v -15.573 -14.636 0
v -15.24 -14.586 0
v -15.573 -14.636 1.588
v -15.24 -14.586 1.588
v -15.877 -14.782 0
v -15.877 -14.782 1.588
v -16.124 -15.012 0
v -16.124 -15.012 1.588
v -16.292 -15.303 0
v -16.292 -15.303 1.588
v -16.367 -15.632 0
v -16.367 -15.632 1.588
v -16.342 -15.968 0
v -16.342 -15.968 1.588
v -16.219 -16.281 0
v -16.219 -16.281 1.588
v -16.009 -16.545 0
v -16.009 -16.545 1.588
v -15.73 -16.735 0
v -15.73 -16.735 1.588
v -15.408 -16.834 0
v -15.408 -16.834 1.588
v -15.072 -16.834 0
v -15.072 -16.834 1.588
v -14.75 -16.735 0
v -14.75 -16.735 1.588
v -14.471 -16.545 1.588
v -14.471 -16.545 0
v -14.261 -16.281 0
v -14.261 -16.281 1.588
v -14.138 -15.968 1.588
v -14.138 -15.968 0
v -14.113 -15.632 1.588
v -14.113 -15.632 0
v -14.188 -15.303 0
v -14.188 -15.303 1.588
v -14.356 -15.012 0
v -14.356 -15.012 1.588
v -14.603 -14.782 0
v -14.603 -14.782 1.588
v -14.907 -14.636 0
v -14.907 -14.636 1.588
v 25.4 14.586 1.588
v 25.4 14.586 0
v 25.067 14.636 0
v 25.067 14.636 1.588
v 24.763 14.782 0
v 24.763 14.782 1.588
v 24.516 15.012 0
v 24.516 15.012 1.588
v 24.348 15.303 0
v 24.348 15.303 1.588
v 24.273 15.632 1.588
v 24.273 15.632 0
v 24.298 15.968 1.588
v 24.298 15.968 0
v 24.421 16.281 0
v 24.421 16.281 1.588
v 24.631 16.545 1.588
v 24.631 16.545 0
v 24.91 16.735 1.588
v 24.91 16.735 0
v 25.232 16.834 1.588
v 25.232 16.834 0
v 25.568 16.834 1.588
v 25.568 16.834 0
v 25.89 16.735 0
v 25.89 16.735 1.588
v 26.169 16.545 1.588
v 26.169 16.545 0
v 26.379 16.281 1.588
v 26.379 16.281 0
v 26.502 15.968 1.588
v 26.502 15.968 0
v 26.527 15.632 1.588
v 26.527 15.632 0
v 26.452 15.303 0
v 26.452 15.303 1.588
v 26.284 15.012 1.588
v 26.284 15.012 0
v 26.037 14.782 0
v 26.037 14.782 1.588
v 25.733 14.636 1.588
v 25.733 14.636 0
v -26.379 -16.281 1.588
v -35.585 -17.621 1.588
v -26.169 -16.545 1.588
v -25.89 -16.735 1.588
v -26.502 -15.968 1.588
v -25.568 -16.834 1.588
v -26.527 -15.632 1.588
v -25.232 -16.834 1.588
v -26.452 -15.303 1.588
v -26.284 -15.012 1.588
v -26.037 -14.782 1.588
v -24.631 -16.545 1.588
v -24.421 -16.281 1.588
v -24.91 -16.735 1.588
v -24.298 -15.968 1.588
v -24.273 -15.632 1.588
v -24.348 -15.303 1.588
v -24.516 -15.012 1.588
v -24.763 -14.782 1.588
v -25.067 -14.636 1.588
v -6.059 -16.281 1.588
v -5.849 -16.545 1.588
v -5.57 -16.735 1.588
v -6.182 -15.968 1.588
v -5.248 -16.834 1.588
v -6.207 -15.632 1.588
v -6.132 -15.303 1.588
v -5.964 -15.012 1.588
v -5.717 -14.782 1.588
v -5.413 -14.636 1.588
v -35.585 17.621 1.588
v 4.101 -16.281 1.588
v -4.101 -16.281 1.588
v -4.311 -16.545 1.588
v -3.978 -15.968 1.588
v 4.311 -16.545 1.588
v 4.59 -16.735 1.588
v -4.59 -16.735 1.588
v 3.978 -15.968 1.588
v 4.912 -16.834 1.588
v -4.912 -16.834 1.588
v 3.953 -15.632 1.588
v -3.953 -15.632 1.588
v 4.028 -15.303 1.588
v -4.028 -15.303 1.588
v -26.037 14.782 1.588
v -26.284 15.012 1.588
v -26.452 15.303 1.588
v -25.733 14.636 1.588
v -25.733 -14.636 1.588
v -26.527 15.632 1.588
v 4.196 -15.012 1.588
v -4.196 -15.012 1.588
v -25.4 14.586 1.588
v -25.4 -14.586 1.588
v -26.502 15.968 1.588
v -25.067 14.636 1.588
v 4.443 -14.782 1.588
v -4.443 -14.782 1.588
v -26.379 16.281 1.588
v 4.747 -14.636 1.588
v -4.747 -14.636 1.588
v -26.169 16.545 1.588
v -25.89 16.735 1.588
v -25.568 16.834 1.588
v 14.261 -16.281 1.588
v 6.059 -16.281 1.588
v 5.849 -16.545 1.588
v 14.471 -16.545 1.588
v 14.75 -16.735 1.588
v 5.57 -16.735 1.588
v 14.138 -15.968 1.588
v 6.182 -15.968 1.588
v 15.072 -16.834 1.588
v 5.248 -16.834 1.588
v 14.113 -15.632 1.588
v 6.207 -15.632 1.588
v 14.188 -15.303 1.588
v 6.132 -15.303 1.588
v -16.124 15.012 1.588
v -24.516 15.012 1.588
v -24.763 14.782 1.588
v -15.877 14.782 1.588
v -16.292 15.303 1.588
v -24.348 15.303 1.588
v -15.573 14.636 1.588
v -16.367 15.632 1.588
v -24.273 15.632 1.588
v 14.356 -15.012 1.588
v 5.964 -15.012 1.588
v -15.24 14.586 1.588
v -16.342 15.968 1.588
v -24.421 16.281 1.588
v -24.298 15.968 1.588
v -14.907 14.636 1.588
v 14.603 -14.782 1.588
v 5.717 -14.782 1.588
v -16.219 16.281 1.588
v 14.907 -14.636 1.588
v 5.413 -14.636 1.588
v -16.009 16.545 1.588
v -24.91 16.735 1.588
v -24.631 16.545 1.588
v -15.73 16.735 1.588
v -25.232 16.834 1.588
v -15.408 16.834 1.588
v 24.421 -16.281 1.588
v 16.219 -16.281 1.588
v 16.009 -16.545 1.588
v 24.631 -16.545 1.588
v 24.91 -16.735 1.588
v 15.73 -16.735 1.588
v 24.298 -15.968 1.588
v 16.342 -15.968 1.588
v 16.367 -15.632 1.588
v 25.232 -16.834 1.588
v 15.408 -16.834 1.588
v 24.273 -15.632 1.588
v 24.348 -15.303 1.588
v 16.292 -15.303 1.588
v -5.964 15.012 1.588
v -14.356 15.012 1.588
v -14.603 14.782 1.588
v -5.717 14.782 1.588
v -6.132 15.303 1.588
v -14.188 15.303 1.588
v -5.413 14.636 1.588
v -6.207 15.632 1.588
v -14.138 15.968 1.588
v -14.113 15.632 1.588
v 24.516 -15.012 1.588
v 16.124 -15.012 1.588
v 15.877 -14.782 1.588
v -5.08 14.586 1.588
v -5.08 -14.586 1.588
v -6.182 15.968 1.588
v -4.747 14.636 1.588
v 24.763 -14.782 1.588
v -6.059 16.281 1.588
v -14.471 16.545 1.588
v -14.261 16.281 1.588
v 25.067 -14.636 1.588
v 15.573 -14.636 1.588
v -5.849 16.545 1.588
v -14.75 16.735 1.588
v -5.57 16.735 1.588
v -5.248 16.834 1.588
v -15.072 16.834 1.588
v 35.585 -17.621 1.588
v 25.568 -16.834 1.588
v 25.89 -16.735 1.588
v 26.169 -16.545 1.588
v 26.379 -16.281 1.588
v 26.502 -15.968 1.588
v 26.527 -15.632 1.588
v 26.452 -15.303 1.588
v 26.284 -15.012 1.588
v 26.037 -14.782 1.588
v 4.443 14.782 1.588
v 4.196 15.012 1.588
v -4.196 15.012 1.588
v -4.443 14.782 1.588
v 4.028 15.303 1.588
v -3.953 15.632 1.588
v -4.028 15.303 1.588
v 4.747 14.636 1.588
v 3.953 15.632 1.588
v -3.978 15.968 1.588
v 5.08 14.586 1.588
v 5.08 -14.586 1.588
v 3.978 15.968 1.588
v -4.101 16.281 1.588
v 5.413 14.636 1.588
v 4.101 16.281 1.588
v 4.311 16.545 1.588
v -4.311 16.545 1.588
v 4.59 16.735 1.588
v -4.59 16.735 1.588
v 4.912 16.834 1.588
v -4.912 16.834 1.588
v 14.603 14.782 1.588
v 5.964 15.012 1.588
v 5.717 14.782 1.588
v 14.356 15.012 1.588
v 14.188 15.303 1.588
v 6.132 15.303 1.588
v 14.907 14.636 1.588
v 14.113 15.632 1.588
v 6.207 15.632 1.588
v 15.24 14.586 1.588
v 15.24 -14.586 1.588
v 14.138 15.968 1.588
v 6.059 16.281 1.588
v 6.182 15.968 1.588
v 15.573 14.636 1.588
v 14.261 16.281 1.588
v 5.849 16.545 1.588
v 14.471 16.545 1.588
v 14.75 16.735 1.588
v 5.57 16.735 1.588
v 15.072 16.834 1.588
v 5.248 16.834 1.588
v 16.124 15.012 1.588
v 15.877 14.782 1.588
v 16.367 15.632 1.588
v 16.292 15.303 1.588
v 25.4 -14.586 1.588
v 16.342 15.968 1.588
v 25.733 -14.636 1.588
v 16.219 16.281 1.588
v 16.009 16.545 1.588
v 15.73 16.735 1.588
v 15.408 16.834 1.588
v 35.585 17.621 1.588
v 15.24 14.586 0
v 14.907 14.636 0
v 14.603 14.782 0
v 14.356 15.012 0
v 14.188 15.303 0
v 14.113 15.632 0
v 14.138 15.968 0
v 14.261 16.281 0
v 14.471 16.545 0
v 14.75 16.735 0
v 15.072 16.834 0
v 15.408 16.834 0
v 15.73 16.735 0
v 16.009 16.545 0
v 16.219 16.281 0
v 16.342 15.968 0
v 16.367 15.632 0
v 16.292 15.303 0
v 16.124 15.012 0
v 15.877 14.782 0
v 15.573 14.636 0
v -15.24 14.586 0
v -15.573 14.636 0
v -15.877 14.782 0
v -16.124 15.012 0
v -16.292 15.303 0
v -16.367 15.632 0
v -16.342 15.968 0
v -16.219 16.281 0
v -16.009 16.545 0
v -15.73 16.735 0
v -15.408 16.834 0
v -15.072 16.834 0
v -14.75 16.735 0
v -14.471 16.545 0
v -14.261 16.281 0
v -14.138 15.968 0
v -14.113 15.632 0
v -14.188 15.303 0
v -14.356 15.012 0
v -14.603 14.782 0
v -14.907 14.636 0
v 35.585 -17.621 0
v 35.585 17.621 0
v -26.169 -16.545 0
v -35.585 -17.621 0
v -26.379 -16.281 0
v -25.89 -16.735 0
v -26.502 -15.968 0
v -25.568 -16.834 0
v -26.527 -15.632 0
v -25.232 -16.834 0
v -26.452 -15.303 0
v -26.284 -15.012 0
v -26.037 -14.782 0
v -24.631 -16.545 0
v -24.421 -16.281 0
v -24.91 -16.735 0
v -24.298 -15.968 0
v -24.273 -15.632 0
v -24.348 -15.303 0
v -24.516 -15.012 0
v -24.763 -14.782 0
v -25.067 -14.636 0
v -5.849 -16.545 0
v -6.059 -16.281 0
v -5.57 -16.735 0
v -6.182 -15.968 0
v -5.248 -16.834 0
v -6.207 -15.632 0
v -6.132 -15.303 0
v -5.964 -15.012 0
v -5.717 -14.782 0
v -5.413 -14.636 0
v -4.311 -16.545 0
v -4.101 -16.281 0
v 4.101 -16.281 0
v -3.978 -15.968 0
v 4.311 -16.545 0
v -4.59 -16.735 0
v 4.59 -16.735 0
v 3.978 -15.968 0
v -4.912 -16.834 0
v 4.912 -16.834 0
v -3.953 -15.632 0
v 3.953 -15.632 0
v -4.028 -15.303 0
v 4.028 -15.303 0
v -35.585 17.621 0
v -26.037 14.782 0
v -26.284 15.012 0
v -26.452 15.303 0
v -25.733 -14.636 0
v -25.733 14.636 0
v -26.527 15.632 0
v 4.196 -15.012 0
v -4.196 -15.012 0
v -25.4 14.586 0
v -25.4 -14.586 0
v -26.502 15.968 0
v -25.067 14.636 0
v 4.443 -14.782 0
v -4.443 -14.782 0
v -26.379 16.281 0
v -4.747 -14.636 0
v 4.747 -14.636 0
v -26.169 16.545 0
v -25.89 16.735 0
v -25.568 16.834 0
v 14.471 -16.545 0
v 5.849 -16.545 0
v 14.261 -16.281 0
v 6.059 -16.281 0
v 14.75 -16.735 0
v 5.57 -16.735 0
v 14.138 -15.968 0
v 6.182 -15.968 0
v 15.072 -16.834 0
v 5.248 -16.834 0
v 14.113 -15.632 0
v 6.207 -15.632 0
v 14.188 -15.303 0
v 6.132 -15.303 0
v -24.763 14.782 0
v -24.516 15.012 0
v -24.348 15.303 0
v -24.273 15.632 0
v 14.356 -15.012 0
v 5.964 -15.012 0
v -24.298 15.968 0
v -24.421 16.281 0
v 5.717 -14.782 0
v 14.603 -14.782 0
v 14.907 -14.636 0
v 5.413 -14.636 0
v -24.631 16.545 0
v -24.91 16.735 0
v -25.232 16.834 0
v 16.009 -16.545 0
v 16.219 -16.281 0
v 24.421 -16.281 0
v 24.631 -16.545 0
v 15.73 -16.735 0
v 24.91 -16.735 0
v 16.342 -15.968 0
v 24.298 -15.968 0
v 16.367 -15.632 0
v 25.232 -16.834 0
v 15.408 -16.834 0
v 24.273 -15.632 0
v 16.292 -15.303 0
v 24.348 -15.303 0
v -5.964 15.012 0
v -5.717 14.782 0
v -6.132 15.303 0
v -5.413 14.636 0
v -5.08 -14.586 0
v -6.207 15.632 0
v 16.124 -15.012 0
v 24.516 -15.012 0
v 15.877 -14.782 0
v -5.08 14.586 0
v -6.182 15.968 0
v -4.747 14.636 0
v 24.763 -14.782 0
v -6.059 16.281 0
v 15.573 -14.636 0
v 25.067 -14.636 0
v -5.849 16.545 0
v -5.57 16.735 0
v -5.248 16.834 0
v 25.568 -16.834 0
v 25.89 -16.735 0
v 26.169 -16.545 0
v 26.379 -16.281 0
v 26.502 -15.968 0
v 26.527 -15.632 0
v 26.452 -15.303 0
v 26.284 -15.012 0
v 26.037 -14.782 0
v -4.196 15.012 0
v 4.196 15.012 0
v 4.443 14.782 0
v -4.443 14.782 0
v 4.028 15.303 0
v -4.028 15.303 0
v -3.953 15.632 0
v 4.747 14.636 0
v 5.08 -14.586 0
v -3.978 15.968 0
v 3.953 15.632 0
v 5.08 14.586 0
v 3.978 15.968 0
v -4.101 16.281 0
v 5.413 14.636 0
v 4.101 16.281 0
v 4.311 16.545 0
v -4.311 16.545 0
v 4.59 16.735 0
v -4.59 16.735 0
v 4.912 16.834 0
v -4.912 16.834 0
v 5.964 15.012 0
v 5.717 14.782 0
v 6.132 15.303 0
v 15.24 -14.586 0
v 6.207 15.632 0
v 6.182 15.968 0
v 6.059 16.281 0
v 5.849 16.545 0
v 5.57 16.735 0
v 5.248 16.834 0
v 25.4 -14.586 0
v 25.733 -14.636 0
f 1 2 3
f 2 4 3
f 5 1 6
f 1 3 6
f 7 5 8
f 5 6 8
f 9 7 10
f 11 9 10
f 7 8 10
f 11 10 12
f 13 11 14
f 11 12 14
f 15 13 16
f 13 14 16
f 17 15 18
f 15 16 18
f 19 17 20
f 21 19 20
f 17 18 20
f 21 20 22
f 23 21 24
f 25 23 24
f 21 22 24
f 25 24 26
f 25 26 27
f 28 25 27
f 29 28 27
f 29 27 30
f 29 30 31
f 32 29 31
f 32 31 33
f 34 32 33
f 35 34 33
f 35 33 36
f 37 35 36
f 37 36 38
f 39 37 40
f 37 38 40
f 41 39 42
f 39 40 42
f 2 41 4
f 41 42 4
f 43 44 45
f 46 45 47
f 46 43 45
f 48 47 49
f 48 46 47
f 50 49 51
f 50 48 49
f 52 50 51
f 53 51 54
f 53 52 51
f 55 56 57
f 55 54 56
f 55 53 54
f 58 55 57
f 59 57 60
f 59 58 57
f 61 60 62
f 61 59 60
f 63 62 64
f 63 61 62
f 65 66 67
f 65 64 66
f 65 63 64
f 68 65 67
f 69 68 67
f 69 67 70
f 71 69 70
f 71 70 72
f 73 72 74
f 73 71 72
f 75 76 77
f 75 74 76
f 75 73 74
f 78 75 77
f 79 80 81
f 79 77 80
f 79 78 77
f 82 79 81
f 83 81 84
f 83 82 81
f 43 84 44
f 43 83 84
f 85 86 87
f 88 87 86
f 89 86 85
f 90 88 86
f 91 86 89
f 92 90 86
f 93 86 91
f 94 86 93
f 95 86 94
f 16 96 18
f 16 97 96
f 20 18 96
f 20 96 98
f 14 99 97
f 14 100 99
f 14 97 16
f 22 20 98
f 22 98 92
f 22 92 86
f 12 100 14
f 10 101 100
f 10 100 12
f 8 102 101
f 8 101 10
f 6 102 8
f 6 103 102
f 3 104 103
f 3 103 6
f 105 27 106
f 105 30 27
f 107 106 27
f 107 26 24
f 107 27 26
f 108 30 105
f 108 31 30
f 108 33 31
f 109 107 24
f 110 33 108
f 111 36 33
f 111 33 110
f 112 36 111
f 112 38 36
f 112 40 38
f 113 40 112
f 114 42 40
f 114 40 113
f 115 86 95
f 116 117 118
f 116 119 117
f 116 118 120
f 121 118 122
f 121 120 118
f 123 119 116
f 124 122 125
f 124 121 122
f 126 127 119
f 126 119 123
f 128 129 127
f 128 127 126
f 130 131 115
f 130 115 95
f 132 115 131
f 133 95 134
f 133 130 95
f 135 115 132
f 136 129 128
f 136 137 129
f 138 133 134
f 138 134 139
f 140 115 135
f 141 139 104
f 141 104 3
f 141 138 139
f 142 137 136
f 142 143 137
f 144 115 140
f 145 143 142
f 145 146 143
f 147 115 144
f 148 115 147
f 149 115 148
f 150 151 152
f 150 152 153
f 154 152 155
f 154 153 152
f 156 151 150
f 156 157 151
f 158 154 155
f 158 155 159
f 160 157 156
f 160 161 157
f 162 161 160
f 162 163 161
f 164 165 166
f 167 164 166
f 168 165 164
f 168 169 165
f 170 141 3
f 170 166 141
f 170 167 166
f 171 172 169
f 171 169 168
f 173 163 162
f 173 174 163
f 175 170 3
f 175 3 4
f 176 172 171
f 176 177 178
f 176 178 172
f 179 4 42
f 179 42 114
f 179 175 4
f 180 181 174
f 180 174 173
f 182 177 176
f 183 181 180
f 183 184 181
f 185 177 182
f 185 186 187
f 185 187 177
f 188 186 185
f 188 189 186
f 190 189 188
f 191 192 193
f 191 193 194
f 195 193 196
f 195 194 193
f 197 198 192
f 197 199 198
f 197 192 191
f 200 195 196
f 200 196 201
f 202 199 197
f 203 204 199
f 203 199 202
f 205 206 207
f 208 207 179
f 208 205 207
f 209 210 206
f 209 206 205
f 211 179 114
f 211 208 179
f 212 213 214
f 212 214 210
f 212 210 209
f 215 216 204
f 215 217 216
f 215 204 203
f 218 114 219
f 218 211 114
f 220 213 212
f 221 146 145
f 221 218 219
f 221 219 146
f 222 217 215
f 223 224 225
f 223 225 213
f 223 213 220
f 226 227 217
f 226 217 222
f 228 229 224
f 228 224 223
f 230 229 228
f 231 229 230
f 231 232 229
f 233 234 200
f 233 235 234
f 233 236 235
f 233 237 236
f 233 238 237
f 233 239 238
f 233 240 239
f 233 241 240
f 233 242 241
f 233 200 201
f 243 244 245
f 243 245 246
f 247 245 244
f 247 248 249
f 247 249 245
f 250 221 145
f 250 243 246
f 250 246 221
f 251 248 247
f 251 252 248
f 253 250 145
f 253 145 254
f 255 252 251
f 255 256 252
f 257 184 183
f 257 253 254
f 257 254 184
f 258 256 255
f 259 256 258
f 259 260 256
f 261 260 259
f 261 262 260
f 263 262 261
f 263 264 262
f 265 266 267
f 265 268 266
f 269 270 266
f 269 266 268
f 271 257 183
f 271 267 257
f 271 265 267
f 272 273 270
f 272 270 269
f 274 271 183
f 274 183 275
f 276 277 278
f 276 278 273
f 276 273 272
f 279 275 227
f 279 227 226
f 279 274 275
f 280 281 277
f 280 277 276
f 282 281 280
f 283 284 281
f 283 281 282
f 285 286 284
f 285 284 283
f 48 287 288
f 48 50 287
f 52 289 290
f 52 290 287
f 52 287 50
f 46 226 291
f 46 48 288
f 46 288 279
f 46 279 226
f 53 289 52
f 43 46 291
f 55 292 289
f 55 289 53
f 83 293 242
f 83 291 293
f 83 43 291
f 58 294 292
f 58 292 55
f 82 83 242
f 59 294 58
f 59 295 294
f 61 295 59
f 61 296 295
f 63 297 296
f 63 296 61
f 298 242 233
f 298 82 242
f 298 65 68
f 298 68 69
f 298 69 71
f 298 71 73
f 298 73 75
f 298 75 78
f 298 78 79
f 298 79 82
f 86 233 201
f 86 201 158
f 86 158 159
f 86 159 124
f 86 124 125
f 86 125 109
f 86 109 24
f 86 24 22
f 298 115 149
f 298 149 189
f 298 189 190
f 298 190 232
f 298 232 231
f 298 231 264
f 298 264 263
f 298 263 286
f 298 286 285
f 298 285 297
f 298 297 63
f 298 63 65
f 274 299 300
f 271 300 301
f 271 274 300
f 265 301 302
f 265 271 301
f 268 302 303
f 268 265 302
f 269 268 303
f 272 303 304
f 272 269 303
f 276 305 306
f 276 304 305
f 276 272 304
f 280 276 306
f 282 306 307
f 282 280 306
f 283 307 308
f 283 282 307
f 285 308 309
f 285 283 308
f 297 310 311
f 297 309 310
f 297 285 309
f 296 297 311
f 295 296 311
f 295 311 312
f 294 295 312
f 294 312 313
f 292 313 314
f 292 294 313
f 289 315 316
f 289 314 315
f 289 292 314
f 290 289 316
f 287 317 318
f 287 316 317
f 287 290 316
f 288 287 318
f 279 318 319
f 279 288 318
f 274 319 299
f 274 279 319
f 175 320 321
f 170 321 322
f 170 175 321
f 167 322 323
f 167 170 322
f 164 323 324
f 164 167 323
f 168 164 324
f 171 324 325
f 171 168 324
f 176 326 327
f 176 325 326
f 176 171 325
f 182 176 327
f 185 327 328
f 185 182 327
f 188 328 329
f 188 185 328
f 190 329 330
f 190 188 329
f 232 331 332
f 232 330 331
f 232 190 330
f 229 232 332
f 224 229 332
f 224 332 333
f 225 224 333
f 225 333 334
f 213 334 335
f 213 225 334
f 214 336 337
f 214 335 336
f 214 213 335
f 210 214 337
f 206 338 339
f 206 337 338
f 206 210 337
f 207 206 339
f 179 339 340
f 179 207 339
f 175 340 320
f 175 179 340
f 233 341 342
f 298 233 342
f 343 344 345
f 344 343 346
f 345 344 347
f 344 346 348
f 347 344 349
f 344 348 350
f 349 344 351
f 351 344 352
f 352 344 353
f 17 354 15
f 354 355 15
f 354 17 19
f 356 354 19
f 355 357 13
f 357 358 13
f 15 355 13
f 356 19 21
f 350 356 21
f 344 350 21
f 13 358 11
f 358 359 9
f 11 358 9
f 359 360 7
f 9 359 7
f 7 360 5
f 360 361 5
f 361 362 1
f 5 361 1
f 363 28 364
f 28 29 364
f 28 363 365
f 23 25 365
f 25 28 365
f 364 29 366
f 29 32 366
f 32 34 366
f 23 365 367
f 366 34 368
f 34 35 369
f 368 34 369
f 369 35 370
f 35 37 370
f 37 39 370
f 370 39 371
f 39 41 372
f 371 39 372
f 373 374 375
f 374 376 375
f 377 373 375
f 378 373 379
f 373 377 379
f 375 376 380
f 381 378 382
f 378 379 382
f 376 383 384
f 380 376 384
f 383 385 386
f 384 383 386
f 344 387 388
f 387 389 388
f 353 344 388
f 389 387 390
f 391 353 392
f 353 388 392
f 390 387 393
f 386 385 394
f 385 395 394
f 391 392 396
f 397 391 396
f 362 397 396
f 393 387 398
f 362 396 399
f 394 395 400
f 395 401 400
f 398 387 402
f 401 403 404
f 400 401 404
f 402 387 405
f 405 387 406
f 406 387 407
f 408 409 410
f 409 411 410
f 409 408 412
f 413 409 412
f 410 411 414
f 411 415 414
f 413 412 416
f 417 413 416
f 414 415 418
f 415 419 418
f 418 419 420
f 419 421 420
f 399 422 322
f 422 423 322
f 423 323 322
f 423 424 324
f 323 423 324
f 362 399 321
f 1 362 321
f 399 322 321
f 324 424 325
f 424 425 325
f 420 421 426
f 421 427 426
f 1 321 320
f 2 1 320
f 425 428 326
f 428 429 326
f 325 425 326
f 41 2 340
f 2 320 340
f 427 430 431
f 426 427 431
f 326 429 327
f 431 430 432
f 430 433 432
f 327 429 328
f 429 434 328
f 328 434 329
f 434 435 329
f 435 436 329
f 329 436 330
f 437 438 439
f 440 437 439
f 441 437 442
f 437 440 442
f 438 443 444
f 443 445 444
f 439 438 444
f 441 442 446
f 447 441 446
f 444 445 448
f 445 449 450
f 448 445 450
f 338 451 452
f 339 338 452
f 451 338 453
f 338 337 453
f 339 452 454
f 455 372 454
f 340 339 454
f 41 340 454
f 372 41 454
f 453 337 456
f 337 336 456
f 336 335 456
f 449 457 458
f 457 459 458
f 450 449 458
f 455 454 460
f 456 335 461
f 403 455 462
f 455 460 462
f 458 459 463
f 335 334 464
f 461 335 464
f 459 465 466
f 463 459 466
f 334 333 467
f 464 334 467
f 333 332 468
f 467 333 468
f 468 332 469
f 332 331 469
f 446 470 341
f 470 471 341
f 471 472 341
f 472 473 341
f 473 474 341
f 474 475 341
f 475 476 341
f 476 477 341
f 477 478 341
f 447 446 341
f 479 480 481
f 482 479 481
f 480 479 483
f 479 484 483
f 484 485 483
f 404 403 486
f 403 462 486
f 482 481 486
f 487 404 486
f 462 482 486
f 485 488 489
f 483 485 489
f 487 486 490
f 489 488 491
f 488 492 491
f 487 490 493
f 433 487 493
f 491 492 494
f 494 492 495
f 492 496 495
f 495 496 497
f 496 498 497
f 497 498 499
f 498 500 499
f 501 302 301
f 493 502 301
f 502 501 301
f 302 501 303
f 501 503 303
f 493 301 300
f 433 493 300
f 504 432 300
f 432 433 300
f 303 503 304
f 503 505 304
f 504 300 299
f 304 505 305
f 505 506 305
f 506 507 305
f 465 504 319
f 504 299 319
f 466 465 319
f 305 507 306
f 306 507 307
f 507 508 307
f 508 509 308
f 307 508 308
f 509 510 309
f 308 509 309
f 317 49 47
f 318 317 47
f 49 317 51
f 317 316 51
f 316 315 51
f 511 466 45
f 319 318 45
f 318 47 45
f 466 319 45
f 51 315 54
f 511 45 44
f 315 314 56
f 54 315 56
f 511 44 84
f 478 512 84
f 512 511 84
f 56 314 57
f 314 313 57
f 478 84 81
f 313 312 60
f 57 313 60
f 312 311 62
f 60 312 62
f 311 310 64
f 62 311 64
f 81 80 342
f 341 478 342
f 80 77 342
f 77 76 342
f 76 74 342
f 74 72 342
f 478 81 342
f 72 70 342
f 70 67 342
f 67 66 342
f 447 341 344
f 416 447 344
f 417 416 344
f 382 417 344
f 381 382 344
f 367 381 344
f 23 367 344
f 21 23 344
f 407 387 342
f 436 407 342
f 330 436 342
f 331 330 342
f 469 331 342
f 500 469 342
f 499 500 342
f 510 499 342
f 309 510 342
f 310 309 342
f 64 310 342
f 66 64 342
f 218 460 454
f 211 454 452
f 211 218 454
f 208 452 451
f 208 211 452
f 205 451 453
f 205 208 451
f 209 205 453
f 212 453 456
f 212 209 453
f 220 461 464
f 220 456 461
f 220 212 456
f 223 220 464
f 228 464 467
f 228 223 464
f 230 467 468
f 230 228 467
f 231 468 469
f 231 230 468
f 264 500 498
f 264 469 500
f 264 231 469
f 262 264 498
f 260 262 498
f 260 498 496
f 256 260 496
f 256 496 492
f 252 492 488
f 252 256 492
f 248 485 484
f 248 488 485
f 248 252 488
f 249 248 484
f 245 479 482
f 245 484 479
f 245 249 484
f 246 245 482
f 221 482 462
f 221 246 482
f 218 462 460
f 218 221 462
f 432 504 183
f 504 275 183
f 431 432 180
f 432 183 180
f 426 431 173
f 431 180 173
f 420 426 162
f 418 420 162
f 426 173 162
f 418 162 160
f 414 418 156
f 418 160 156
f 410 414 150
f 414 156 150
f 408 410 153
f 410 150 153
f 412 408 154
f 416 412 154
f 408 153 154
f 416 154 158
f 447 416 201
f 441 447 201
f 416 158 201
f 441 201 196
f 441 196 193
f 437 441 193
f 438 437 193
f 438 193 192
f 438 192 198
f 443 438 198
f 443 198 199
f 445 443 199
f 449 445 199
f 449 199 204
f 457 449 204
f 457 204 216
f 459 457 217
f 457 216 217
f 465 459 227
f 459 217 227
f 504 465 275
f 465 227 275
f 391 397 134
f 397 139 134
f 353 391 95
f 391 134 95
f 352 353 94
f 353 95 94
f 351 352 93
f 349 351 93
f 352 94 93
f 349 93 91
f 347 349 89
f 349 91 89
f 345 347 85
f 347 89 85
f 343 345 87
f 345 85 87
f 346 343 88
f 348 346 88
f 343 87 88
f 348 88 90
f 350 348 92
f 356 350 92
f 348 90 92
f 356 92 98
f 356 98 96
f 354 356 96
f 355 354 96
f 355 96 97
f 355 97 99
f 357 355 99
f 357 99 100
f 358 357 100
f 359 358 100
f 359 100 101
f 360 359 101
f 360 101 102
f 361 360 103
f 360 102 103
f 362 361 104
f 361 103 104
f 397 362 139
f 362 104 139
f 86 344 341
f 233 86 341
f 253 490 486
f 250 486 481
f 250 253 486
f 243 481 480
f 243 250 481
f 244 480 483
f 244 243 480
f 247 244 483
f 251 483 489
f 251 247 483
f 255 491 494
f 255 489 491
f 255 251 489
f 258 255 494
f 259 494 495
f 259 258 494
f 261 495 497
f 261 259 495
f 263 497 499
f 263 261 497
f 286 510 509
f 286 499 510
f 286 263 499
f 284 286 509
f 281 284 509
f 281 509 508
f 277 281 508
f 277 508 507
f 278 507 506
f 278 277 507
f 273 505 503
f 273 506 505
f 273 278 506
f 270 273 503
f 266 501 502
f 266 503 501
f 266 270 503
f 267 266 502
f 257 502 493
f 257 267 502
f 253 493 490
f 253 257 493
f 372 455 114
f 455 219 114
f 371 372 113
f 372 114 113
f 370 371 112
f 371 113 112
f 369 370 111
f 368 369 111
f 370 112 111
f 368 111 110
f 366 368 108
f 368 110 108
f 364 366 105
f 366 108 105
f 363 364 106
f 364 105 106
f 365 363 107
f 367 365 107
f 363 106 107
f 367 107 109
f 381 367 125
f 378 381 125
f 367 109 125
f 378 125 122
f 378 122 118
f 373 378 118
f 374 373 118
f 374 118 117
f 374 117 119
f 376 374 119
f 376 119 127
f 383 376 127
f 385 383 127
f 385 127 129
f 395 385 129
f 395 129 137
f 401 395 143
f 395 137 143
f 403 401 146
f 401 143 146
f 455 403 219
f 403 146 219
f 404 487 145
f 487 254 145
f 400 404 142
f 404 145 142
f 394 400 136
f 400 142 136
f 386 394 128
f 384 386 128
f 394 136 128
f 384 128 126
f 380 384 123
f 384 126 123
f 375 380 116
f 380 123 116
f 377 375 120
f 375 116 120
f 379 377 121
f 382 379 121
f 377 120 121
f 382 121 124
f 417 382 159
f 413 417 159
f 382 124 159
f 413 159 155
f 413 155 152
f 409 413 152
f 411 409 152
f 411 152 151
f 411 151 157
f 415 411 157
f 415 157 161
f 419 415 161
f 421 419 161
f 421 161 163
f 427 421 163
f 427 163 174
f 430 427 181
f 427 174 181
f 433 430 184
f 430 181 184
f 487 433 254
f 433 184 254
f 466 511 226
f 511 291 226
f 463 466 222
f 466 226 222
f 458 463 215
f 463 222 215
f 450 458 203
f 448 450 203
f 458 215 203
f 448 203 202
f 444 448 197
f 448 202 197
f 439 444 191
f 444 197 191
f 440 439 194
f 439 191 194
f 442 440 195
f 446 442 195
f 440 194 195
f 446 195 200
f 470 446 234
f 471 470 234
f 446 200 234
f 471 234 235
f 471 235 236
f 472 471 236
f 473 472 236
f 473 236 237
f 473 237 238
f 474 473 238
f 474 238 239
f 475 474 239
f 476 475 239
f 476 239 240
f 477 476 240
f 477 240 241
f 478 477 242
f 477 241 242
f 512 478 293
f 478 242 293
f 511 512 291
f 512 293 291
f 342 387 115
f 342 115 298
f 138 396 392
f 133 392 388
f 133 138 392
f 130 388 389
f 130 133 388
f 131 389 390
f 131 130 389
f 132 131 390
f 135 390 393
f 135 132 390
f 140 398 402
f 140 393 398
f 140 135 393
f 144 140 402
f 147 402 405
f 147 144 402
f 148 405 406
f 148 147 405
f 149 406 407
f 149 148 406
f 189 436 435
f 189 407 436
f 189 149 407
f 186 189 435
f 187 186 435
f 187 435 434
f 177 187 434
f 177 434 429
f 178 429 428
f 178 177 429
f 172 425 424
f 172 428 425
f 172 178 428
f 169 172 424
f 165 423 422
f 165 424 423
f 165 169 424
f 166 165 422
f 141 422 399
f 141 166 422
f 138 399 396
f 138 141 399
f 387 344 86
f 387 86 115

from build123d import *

# Parameters (mm, degrees)
SKETCH1_W           = 71.1708
SKETCH1_H           = 35.2425
BOSS_EXTRUDE1_DEPTH = 1.5875
LPATTERN1_COUNT     = 6
LPATTERN1_PITCH     = 10.16


with BuildPart() as part:
    # Sketch1 → Boss-Extrude1 (new body)
    with BuildSketch(Plane.XY):
        Rectangle(SKETCH1_W, SKETCH1_H)
    extrude(amount=BOSS_EXTRUDE1_DEPTH)

    # Sketch3 → #2 Clearance Hole1 (revolve, cut)
    with BuildSketch(Plane(origin=(-25.4, 15.71625, 1.5875), x_dir=(0, -1, 0), z_dir=(1, 0, 0))):
        Polygon((0, 0), (0, 3.854152758), (1.1303, 3.175), (1.1303, 0), align=None)
    f_2_clearance_hole1 = revolve(axis=Axis((-25.4, 15.71625, 7.9375), (0, 0, -1)), mode=Mode.SUBTRACT)

    # LPattern1: #2 Clearance Hole1 ×6
    with Locations(*[(i * LPATTERN1_PITCH, 0, 0) for i in range(1, LPATTERN1_COUNT)]):
        add(f_2_clearance_hole1, mode=Mode.SUBTRACT)

    # Mirror1: #2 Clearance Hole1 across plane
    add(f_2_clearance_hole1.mirror(Plane.ZX), mode=Mode.SUBTRACT)

    # Mirror1 copy 1 sketch → Mirror1 copy 1 (revolve, cut)
    with BuildSketch(Plane(origin=(-15.24, -15.71625, 1.5875), x_dir=(0, 1, 0), z_dir=(1, 0, 0))):
        Polygon((0, 0), (0, -3.854152758), (1.1303, -3.175), (1.1303, 0), align=None)
    revolve(axis=Axis((-15.24, -15.71625, 7.9375), (0, 0, 1)), mode=Mode.SUBTRACT)

    # Mirror1 copy 2 sketch → Mirror1 copy 2 (revolve, cut)
    with BuildSketch(Plane(origin=(-5.08, -15.71625, 1.5875), x_dir=(0, 1, 0), z_dir=(1, 0, 0))):
        Polygon((0, 0), (0, -3.854152758), (1.1303, -3.175), (1.1303, 0), align=None)
    revolve(axis=Axis((-5.08, -15.71625, 7.9375), (0, 0, 1)), mode=Mode.SUBTRACT)

    # Mirror1 copy 3 sketch → Mirror1 copy 3 (revolve, cut)
    with BuildSketch(Plane(origin=(5.08, -15.71625, 1.5875), x_dir=(0, 1, 0), z_dir=(1, 0, 0))):
        Polygon((0, 0), (0, -3.854152758), (1.1303, -3.175), (1.1303, 0), align=None)
    revolve(axis=Axis((5.08, -15.71625, 7.9375), (0, 0, 1)), mode=Mode.SUBTRACT)

    # Mirror1 copy 4 sketch → Mirror1 copy 4 (revolve, cut)
    with BuildSketch(Plane(origin=(15.24, -15.71625, 1.5875), x_dir=(0, 1, 0), z_dir=(1, 0, 0))):
        Polygon((0, 0), (0, -3.854152758), (1.1303, -3.175), (1.1303, 0), align=None)
    revolve(axis=Axis((15.24, -15.71625, 7.9375), (0, 0, 1)), mode=Mode.SUBTRACT)

    # Mirror1 copy 5 sketch → Mirror1 copy 5 (revolve, cut)
    with BuildSketch(Plane(origin=(25.4, -15.71625, 1.5875), x_dir=(0, 1, 0), z_dir=(1, 0, 0))):
        Polygon((0, 0), (0, -3.854152758), (1.1303, -3.175), (1.1303, 0), align=None)
    revolve(axis=Axis((25.4, -15.71625, 7.9375), (0, 0, 1)), mode=Mode.SUBTRACT)


solid = part.part
